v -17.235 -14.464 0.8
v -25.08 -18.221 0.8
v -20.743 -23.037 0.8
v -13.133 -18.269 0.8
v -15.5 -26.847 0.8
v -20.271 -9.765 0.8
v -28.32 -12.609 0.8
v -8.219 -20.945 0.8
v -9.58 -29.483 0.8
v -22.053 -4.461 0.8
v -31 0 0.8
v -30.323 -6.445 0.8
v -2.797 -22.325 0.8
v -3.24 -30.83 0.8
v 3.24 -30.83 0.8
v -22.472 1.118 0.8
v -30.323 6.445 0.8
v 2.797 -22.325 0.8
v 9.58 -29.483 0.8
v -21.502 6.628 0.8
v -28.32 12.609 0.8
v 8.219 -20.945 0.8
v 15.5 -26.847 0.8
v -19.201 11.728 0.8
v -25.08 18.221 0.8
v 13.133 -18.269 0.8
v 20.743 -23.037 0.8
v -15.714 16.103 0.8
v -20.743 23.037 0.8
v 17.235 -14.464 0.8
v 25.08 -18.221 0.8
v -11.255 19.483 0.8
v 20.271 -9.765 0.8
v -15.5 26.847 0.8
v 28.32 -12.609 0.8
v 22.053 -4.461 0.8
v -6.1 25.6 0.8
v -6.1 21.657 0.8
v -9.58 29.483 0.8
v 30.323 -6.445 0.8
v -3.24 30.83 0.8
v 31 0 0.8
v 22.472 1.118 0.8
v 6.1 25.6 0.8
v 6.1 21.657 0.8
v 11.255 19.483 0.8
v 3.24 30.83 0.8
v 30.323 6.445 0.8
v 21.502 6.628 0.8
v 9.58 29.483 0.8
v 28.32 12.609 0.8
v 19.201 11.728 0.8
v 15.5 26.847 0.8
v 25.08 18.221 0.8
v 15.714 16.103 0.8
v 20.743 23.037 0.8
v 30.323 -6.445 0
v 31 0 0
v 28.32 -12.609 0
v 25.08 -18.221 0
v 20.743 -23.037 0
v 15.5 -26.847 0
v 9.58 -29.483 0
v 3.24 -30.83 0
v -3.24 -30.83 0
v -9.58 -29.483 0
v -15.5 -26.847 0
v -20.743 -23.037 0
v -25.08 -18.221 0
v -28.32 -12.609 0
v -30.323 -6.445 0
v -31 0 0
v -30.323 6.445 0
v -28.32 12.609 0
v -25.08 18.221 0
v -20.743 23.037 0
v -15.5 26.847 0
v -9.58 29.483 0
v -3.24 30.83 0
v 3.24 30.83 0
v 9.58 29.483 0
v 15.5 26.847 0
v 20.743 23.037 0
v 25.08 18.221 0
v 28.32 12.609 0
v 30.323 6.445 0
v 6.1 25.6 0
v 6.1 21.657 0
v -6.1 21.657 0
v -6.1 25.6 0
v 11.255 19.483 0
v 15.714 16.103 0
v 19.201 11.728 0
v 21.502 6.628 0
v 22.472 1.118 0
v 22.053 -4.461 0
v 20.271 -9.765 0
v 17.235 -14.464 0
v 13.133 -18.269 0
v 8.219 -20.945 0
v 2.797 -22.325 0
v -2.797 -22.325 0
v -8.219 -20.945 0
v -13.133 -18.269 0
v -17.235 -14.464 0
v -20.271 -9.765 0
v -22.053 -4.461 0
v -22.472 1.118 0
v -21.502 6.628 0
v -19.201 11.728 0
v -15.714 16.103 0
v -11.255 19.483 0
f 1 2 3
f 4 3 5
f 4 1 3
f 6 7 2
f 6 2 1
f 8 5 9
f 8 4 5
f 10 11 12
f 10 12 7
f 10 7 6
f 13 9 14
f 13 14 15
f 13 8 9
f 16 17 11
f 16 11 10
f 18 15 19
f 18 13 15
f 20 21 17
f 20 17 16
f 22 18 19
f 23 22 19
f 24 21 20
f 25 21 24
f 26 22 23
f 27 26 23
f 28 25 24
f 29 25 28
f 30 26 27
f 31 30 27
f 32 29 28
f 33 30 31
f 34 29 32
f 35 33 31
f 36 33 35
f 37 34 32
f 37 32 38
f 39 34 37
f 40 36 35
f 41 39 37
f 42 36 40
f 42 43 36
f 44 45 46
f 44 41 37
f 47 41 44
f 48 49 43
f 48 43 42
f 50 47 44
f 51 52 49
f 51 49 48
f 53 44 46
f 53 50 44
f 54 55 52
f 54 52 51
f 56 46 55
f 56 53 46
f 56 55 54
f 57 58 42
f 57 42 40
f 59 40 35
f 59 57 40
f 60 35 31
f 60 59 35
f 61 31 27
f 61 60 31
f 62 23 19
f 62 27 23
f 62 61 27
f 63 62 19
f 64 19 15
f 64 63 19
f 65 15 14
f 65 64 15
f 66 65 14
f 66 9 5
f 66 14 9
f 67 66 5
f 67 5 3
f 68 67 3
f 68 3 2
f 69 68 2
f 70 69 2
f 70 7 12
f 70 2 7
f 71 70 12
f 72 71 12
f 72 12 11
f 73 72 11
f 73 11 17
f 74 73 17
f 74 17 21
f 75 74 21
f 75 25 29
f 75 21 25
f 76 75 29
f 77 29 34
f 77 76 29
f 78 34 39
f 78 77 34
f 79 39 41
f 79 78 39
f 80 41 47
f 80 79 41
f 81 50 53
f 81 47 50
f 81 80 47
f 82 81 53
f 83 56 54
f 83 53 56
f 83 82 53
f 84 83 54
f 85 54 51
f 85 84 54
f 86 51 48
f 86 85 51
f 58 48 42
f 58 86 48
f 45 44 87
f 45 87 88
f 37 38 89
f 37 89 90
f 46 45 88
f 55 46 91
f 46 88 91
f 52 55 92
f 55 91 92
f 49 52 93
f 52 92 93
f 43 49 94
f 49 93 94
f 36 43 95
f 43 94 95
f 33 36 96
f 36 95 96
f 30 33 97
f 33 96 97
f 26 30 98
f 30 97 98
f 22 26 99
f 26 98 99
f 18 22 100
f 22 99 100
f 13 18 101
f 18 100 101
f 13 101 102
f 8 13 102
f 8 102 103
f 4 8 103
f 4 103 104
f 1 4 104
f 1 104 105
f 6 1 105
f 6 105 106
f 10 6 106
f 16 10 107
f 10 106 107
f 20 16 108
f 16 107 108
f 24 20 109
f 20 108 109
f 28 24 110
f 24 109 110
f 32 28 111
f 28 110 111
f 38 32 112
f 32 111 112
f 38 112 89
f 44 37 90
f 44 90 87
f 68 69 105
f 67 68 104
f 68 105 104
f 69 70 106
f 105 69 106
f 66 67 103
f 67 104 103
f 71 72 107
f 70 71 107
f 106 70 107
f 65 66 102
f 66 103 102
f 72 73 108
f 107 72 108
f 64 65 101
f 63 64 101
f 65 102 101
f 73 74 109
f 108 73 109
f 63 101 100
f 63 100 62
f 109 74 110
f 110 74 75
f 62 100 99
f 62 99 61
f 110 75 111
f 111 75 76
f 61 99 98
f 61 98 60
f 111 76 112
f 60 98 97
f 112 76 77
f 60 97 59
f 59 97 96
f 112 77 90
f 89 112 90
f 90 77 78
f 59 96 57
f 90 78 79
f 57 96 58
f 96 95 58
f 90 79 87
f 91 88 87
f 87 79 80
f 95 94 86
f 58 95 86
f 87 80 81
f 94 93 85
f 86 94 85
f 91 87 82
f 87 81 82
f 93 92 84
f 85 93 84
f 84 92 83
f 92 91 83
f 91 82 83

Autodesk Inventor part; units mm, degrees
ref_plane "YZ Plane" through (0, 0, 0) normal (1, 0, 0) x (0, 1, 0)
ref_plane "XZ Plane" through (0, 0, 0) normal (0, 1, 0) x (-1, 0, 0)
ref_plane "XY Plane" through (0, 0, 0) normal (0, 0, 1) x (1, 0, 0)
sketch "草圖1" plane through (0, 0, 0) normal (0, 0, 1) x (1, 0, 0)
  circle A0 centre (0, 0) radius 22.5
  circle A1 centre (0, 0) radius 31
  dimension "d0" = 45
  dimension "d1" = 62
extrude "擠出1" add sketch "草圖1" along normal blind 0.8
sketch "草圖2" plane through (0, 0, 0.8) normal (0, 0, 1) x (1, 0, 0)
  line L0 (-6.1, 25.6) -> (6.1, 25.6)
  line L1 (6.1, 25.6) -> (6.1, 13.8504)
  line L2 (6.1, 13.8504) -> (-6.1, 13.8504)
  line L3 (-6.1, 13.8504) -> (-6.1, 25.6)
  point P0 (0, 0)
  dimension "d5" = 6.1
  dimension "d6" = 12.2
  dimension "d7" = 25.6
extrude "擠出2" cut sketch "草圖2" against normal blind 0.8
properties part number "軸心墊片"
